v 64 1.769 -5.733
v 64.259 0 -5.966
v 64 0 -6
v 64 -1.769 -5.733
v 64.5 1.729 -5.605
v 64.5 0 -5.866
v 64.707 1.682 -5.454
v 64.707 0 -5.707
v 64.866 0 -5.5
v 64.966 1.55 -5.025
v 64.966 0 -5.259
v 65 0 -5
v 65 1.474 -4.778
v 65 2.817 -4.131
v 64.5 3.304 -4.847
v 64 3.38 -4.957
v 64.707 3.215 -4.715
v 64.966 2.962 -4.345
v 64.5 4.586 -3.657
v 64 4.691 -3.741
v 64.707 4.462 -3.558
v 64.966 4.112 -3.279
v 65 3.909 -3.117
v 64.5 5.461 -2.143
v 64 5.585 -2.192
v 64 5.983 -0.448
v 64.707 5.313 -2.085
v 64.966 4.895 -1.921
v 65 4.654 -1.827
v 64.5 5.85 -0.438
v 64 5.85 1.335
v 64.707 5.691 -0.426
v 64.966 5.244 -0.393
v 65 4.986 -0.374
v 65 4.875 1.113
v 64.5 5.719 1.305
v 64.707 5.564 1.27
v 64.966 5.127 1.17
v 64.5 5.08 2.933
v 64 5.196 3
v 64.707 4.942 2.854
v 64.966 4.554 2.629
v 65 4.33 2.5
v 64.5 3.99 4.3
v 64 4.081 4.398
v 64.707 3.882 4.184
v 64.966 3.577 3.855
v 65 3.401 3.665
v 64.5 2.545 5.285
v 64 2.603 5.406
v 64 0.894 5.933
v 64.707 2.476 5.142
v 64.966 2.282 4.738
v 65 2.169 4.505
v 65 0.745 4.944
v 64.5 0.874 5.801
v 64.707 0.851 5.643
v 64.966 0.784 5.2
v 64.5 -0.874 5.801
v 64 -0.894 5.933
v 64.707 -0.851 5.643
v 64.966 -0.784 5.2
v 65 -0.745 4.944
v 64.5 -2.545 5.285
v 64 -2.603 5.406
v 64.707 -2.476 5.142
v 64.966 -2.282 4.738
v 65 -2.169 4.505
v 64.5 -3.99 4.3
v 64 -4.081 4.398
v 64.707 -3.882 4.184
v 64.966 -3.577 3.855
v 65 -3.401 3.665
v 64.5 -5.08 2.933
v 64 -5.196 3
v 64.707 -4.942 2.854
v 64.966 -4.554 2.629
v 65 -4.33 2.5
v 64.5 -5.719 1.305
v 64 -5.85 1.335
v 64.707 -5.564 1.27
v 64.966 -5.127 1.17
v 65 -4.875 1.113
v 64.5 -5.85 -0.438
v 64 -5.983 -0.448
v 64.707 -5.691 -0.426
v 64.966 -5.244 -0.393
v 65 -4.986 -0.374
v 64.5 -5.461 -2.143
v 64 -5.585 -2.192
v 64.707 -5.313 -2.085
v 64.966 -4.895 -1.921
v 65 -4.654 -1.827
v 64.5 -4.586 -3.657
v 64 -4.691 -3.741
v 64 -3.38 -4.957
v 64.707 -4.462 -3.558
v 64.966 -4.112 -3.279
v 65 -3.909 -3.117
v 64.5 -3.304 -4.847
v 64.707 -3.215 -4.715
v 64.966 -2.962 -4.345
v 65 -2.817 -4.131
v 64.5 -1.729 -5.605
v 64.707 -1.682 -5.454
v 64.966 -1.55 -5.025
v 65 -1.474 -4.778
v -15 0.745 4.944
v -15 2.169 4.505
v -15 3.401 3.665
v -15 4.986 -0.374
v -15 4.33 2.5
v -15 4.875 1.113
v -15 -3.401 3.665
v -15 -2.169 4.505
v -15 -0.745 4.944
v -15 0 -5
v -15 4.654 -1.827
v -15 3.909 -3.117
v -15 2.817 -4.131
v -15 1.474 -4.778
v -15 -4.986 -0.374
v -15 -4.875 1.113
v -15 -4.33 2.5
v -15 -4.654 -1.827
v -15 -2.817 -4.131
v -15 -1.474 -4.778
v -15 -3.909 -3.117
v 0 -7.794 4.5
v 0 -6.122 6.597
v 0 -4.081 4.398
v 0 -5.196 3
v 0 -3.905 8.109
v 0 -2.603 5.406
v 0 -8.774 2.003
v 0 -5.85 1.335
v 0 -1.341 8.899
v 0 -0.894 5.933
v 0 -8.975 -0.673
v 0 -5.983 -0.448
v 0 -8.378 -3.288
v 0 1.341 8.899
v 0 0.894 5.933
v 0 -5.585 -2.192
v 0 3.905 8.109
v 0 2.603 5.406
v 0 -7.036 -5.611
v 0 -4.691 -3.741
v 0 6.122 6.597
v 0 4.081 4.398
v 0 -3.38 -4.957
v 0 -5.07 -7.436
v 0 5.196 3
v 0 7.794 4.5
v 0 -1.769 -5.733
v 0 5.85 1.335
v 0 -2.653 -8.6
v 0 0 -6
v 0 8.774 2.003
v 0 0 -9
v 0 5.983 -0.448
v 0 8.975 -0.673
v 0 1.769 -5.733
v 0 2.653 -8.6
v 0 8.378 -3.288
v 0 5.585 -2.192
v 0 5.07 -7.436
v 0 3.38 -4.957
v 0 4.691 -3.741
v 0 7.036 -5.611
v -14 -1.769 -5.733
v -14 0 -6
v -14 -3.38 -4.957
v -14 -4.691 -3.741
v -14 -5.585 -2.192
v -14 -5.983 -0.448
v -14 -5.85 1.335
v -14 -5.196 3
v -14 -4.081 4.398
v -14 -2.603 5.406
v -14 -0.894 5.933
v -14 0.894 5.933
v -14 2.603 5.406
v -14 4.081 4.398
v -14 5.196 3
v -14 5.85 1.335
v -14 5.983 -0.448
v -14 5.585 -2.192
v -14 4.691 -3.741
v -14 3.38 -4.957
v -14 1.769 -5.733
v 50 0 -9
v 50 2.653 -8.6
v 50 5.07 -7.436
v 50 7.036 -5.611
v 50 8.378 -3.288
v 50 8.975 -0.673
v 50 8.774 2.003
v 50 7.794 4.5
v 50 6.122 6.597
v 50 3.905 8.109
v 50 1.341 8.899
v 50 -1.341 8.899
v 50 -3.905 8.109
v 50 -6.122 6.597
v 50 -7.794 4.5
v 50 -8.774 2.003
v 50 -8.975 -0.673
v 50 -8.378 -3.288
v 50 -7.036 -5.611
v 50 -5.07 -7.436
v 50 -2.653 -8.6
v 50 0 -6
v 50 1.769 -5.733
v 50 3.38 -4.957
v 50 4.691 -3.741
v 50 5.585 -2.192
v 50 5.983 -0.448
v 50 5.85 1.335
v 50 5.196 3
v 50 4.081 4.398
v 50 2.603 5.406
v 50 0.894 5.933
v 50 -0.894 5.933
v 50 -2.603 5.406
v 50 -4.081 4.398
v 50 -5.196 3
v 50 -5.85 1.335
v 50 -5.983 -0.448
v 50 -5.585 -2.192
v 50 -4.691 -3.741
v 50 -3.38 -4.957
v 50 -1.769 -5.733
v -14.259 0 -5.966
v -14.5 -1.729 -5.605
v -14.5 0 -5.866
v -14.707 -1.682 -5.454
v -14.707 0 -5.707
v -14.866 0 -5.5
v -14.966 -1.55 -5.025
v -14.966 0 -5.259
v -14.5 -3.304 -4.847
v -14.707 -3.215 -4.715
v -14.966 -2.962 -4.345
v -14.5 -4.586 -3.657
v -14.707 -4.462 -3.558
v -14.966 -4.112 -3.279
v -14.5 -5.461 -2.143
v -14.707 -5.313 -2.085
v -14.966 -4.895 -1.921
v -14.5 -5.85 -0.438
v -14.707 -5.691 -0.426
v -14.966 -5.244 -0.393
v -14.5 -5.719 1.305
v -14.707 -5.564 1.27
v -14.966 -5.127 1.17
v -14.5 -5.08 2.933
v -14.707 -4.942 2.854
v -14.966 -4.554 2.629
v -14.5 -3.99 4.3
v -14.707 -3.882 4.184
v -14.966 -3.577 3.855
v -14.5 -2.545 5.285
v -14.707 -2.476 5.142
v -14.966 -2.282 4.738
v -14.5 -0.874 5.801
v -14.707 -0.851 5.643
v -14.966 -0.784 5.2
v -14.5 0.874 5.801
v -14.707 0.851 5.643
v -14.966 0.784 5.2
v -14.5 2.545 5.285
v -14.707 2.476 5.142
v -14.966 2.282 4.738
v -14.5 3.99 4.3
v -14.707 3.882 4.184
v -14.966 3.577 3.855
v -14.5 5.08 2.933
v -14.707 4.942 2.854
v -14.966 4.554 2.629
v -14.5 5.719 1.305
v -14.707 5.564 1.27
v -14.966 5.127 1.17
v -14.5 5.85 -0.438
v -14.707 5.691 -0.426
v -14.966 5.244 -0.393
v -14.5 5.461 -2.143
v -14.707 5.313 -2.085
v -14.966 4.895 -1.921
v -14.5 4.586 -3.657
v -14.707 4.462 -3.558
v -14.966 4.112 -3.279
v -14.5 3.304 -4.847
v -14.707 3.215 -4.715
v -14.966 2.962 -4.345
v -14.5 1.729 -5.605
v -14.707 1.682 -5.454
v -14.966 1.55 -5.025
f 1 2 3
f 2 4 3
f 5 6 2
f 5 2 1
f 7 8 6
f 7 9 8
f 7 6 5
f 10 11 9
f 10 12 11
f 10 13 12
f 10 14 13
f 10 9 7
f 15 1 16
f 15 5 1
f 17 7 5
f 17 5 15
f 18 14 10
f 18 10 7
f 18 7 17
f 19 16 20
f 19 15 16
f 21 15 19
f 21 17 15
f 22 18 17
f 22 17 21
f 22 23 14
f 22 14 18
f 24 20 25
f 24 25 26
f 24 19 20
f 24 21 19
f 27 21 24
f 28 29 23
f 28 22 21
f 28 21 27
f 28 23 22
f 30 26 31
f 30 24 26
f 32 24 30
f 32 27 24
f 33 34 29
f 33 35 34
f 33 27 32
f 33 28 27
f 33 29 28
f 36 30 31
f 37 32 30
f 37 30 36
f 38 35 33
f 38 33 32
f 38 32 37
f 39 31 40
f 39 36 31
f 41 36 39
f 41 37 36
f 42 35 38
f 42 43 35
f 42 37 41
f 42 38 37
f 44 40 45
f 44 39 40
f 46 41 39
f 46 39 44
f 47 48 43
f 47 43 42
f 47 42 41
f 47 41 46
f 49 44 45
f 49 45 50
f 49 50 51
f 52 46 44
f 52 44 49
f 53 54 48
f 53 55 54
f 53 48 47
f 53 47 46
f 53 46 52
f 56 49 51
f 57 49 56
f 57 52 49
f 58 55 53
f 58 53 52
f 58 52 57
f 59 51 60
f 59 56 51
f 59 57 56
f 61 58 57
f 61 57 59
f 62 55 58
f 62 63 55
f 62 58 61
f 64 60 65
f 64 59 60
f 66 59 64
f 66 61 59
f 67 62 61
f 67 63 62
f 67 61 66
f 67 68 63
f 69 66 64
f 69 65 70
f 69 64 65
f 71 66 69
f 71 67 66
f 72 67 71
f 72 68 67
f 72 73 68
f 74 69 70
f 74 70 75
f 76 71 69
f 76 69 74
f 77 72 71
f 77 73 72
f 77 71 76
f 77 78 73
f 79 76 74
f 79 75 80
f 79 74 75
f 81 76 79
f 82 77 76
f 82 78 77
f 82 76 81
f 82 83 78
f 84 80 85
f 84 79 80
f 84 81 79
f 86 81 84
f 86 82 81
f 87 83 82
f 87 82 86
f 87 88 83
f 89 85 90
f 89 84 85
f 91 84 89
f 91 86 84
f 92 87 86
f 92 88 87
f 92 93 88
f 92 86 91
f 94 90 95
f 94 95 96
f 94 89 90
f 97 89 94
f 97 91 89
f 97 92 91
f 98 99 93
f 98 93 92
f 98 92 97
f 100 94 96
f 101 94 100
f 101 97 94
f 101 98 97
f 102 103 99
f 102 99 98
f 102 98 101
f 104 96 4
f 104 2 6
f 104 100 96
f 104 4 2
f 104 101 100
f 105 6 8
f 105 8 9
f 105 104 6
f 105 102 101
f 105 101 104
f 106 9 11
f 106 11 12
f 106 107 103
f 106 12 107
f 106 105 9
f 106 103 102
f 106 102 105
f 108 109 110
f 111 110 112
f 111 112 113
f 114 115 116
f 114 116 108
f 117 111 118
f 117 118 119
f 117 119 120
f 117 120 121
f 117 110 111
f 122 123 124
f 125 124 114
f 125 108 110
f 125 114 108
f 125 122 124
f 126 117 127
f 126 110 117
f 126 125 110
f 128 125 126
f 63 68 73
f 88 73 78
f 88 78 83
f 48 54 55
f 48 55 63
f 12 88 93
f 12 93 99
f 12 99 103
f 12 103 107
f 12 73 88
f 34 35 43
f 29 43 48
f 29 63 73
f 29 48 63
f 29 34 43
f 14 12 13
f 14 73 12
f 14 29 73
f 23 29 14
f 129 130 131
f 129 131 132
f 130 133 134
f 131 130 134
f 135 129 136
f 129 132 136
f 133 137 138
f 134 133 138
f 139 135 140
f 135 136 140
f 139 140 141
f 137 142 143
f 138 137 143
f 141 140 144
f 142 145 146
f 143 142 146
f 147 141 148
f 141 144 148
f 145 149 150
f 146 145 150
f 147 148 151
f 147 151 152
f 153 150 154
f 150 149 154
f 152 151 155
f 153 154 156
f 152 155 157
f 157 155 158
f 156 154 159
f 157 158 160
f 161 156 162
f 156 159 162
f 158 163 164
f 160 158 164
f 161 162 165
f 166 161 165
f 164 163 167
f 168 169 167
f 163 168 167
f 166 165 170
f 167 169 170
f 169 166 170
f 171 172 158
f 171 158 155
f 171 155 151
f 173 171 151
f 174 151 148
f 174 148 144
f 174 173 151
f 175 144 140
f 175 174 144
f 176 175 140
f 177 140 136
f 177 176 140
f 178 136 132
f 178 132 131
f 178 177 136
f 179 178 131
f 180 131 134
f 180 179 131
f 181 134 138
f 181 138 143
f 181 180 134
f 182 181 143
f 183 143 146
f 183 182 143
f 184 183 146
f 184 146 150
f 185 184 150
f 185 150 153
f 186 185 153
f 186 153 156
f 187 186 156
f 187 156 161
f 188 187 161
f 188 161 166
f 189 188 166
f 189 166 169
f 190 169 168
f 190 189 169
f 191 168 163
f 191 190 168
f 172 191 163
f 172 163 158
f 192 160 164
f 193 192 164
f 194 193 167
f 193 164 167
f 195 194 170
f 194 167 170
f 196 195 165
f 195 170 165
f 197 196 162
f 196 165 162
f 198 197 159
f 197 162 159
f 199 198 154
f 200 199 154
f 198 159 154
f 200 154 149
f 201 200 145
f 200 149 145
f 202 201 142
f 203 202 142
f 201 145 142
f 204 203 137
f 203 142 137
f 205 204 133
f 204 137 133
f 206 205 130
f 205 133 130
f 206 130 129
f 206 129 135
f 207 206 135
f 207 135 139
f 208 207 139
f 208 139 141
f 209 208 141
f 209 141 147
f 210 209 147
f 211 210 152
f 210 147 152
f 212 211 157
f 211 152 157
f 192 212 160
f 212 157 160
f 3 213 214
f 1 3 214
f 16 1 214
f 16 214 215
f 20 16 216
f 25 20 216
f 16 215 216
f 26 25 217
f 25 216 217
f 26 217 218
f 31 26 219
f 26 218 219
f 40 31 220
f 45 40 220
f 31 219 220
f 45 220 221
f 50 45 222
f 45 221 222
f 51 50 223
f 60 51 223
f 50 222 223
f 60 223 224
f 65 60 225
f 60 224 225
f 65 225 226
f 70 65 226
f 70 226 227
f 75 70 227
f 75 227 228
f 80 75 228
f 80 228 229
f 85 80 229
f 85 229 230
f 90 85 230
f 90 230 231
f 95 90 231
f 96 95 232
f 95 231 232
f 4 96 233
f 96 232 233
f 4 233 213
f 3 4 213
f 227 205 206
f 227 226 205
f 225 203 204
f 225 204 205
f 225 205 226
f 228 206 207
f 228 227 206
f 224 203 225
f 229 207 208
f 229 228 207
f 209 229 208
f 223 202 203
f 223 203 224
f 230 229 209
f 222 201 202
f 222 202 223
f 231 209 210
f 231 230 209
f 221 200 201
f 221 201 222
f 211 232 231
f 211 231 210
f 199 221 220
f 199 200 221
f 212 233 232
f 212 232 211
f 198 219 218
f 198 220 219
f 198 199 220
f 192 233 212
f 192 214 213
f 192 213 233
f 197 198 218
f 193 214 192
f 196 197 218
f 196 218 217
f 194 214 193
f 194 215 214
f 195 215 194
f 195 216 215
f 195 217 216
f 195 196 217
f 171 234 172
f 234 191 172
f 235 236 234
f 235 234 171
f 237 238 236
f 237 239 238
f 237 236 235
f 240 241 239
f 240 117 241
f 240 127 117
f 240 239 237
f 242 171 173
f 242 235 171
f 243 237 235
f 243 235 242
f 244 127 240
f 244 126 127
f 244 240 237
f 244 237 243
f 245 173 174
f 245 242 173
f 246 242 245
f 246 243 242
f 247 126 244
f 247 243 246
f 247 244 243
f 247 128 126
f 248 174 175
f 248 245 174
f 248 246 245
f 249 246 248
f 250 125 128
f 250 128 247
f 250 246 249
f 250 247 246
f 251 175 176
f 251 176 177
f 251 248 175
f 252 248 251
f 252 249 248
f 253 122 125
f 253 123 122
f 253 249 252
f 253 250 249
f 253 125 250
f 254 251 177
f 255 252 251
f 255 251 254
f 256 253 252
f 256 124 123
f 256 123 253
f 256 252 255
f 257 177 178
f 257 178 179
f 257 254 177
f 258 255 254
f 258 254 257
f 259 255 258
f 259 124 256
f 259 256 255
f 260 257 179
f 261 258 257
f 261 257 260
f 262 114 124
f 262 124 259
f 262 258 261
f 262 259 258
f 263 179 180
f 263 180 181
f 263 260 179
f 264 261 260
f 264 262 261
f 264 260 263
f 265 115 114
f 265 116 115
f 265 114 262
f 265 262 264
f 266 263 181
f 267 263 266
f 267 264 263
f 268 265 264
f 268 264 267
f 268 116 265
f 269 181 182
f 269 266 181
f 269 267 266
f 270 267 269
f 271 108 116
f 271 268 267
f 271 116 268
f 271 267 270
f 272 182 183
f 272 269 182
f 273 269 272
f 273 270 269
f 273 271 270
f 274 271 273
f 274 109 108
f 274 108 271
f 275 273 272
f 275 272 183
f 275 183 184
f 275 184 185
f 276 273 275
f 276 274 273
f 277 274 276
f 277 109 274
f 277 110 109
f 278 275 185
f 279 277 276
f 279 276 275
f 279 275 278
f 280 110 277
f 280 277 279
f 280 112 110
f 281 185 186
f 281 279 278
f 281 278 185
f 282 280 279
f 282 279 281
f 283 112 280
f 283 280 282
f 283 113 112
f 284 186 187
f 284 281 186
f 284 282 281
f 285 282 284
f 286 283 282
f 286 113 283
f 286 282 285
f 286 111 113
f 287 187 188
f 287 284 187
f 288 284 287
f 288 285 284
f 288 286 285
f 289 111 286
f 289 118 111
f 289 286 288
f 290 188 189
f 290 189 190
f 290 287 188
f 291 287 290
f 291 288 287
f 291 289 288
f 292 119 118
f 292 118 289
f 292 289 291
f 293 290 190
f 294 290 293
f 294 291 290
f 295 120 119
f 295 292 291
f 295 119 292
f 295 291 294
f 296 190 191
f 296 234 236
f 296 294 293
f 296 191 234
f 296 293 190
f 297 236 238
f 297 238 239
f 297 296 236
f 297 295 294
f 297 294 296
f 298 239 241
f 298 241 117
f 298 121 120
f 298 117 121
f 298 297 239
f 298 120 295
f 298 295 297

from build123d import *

# Parameters (mm, degrees)
SKETCH1_R           = 9
BOSS_EXTRUDE1_DEPTH = 50
SKETCH2_R           = 6
BOSS_EXTRUDE2_DEPTH = 15
BOSS_EXTRUDE3_START = 15
SKETCH3_R           = 6
BOSS_EXTRUDE3_DEPTH = 15
FILLET1_R           = 1
FILLET2_R           = 1


with BuildPart() as part:
    # Sketch1 → Boss-Extrude1 (new body)
    with BuildSketch(Plane(origin=(0, 0, 0), x_dir=(0, 0, -1), z_dir=(1, 0, 0))):
        Circle(SKETCH1_R)
    extrude(amount=BOSS_EXTRUDE1_DEPTH)

    # Sketch2 → Boss-Extrude2 (add)
    with BuildSketch(Plane(origin=(50, 0, 0), x_dir=(0, 0, -1), z_dir=(1, 0, 0))):
        Circle(SKETCH2_R)
    extrude(amount=BOSS_EXTRUDE2_DEPTH)

    # Sketch3 → Boss-Extrude3 (add)
    with BuildSketch(Plane.ZY.offset(BOSS_EXTRUDE3_START)):
        with Locations(Location((0, 0, 0), (0, 0, 180))):
            Circle(SKETCH3_R)
    extrude(amount=-BOSS_EXTRUDE3_DEPTH)

    # Fillet1
    fillet1_edges = [part.edges().sort_by_distance(p)[0] for p in [
        (-15, 0, 6),
    ]]
    fillet(fillet1_edges, radius=FILLET1_R)

    # Fillet2
    fillet2_edges = [part.edges().sort_by_distance(p)[0] for p in [
        (65, 0, 6),
    ]]
    fillet(fillet2_edges, radius=FILLET2_R)


solid = part.part
